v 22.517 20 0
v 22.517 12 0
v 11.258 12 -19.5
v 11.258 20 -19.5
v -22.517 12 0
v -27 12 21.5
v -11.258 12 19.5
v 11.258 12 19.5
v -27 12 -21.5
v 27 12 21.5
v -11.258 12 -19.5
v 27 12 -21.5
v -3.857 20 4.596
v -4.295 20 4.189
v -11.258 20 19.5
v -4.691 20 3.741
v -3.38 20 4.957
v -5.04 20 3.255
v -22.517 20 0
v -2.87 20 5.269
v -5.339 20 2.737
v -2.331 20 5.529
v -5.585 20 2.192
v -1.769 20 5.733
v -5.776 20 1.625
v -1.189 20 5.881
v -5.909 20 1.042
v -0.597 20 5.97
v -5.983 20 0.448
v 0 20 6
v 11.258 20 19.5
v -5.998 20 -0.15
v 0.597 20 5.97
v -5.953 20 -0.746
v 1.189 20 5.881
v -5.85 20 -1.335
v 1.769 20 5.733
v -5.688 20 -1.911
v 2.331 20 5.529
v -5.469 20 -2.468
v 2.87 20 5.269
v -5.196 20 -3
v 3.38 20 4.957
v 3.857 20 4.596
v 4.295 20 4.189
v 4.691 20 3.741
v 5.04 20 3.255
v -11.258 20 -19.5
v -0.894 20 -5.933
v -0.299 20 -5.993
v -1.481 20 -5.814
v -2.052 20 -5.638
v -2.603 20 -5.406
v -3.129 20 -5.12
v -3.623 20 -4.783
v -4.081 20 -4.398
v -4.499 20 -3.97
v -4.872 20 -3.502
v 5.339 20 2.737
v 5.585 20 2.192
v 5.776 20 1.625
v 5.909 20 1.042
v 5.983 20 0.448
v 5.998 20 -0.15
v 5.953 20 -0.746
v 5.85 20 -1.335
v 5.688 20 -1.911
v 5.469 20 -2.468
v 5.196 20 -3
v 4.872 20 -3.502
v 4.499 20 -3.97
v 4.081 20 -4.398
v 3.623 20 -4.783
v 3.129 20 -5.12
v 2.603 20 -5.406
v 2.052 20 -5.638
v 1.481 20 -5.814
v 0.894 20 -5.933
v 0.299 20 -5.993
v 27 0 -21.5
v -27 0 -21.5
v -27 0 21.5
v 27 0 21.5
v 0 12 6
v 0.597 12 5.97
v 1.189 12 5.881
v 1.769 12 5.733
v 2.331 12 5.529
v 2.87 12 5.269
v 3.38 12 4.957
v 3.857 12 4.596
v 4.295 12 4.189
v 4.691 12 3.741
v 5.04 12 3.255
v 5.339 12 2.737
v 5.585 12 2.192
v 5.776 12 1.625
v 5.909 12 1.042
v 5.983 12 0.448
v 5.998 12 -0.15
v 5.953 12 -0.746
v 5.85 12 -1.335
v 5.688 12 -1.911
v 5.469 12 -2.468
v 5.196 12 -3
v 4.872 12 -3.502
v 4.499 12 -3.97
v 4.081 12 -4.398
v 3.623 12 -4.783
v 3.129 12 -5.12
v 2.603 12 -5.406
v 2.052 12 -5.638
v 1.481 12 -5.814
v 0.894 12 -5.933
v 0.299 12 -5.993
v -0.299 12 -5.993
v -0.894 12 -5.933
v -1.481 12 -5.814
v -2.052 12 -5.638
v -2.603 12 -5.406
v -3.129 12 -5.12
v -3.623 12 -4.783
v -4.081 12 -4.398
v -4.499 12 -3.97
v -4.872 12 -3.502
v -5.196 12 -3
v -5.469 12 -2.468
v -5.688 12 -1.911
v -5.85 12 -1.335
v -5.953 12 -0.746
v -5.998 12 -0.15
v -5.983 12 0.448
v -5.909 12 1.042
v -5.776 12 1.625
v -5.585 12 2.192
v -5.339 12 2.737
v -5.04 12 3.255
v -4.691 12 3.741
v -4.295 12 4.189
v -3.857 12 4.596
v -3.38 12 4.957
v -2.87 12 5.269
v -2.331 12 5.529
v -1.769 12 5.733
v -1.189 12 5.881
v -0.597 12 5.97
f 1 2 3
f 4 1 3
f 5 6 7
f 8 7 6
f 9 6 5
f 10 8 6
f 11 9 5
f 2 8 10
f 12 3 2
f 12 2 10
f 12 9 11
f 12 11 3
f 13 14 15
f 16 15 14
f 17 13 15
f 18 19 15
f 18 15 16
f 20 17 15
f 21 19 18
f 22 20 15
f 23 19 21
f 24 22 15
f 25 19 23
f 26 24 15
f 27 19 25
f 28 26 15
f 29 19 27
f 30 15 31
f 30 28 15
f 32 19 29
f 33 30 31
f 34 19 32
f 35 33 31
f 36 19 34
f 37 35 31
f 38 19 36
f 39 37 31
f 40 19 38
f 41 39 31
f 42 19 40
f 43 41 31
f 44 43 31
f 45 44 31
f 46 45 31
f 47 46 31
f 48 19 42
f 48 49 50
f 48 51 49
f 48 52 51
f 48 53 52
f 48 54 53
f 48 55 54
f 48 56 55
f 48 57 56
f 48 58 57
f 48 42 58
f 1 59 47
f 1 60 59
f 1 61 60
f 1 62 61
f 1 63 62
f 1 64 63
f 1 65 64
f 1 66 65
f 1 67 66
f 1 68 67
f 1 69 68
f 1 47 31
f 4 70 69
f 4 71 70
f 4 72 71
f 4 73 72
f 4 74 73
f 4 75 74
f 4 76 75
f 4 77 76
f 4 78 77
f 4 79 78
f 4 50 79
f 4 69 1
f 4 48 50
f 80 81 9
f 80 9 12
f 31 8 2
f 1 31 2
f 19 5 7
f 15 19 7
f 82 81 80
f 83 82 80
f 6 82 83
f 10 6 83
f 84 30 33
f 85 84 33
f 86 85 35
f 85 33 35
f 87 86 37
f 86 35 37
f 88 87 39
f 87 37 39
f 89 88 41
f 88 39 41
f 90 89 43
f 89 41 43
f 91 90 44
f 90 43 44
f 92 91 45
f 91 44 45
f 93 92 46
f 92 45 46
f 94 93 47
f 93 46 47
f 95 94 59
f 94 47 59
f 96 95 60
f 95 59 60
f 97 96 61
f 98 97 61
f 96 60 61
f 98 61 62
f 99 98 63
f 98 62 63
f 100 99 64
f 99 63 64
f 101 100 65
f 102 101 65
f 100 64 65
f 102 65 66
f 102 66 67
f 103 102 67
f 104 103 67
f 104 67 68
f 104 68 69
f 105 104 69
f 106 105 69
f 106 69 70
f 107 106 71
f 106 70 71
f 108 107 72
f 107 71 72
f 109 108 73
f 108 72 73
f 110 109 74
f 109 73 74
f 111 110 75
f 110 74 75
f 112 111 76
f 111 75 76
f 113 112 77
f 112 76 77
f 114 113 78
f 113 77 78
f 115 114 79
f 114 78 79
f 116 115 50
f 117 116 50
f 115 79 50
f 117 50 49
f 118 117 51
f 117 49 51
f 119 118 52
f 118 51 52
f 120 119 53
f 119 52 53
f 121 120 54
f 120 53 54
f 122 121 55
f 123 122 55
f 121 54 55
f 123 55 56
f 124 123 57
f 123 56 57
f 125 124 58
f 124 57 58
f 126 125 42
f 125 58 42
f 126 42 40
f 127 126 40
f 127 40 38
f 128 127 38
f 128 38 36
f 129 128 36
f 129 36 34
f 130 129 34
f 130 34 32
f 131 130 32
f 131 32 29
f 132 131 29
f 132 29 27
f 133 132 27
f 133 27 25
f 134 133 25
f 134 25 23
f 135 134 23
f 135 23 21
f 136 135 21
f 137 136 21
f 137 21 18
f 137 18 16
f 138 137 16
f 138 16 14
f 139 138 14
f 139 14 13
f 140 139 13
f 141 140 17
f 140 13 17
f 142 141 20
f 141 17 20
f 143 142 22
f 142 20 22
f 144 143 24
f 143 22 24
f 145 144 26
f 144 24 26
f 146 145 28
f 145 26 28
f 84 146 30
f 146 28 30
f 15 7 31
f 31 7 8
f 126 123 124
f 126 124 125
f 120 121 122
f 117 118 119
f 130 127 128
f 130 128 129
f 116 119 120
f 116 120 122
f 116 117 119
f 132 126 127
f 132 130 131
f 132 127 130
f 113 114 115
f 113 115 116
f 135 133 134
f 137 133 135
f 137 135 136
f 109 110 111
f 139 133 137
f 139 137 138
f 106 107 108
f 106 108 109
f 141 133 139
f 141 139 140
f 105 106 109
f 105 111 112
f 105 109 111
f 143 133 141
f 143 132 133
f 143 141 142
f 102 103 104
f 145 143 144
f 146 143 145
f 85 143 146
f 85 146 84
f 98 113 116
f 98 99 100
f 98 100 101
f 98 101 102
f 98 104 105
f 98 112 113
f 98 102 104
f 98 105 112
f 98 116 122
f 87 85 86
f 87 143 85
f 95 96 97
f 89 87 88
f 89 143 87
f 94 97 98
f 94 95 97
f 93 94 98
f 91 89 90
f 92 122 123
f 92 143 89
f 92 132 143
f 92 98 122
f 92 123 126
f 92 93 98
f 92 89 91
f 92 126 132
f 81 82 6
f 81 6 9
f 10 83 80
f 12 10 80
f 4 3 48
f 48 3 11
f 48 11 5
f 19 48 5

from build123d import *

# Parameters (mm, degrees)
SKETCH_1_W          = 54
SKETCH_1_H          = 43
EXTRUDE_1_DEPTH     = 12
SKETCH_2_R          = 1.55
EXTRUDE_2_DEPTH     = 8
SKETCH_4_R          = 6
CUT_EXTRUDE_2_DEPTH = 8


with BuildPart() as part:
    # 草图1 → 凸台-拉伸1 (new body)
    with BuildSketch(Plane(origin=(0, 0, 0), x_dir=(1, 0, 0), z_dir=(0, 1, 0))):
        Rectangle(SKETCH_1_W, SKETCH_1_H)
    extrude(amount=EXTRUDE_1_DEPTH)

    # 草图2 → 凸台-拉伸2 (add)
    with BuildSketch(Plane(origin=(0, 12, 0), x_dir=(1, 0, 0), z_dir=(0, 1, 0))):
        Polygon((-22.516660498, 0), (-11.258330249, -19.5), (11.258330249, -19.5), (22.516660498, 0), (11.258330249, 19.5), (-11.258330249, 19.5), align=None)
        with Locations(Location((0, 0, 0), (0, 0, 270))):
            Circle(SKETCH_2_R, mode=Mode.SUBTRACT)
    extrude(amount=EXTRUDE_2_DEPTH)

    # 草图4 → 切除-拉伸2 (cut)
    with BuildSketch(Plane(origin=(0, 20, 0), x_dir=(1, 0, 0), z_dir=(0, 1, 0))):
        with Locations(Location((0, 0, 0), (0, 0, 270))):
            Circle(SKETCH_4_R)
    extrude(amount=-CUT_EXTRUDE_2_DEPTH, mode=Mode.SUBTRACT)


solid = part.part
